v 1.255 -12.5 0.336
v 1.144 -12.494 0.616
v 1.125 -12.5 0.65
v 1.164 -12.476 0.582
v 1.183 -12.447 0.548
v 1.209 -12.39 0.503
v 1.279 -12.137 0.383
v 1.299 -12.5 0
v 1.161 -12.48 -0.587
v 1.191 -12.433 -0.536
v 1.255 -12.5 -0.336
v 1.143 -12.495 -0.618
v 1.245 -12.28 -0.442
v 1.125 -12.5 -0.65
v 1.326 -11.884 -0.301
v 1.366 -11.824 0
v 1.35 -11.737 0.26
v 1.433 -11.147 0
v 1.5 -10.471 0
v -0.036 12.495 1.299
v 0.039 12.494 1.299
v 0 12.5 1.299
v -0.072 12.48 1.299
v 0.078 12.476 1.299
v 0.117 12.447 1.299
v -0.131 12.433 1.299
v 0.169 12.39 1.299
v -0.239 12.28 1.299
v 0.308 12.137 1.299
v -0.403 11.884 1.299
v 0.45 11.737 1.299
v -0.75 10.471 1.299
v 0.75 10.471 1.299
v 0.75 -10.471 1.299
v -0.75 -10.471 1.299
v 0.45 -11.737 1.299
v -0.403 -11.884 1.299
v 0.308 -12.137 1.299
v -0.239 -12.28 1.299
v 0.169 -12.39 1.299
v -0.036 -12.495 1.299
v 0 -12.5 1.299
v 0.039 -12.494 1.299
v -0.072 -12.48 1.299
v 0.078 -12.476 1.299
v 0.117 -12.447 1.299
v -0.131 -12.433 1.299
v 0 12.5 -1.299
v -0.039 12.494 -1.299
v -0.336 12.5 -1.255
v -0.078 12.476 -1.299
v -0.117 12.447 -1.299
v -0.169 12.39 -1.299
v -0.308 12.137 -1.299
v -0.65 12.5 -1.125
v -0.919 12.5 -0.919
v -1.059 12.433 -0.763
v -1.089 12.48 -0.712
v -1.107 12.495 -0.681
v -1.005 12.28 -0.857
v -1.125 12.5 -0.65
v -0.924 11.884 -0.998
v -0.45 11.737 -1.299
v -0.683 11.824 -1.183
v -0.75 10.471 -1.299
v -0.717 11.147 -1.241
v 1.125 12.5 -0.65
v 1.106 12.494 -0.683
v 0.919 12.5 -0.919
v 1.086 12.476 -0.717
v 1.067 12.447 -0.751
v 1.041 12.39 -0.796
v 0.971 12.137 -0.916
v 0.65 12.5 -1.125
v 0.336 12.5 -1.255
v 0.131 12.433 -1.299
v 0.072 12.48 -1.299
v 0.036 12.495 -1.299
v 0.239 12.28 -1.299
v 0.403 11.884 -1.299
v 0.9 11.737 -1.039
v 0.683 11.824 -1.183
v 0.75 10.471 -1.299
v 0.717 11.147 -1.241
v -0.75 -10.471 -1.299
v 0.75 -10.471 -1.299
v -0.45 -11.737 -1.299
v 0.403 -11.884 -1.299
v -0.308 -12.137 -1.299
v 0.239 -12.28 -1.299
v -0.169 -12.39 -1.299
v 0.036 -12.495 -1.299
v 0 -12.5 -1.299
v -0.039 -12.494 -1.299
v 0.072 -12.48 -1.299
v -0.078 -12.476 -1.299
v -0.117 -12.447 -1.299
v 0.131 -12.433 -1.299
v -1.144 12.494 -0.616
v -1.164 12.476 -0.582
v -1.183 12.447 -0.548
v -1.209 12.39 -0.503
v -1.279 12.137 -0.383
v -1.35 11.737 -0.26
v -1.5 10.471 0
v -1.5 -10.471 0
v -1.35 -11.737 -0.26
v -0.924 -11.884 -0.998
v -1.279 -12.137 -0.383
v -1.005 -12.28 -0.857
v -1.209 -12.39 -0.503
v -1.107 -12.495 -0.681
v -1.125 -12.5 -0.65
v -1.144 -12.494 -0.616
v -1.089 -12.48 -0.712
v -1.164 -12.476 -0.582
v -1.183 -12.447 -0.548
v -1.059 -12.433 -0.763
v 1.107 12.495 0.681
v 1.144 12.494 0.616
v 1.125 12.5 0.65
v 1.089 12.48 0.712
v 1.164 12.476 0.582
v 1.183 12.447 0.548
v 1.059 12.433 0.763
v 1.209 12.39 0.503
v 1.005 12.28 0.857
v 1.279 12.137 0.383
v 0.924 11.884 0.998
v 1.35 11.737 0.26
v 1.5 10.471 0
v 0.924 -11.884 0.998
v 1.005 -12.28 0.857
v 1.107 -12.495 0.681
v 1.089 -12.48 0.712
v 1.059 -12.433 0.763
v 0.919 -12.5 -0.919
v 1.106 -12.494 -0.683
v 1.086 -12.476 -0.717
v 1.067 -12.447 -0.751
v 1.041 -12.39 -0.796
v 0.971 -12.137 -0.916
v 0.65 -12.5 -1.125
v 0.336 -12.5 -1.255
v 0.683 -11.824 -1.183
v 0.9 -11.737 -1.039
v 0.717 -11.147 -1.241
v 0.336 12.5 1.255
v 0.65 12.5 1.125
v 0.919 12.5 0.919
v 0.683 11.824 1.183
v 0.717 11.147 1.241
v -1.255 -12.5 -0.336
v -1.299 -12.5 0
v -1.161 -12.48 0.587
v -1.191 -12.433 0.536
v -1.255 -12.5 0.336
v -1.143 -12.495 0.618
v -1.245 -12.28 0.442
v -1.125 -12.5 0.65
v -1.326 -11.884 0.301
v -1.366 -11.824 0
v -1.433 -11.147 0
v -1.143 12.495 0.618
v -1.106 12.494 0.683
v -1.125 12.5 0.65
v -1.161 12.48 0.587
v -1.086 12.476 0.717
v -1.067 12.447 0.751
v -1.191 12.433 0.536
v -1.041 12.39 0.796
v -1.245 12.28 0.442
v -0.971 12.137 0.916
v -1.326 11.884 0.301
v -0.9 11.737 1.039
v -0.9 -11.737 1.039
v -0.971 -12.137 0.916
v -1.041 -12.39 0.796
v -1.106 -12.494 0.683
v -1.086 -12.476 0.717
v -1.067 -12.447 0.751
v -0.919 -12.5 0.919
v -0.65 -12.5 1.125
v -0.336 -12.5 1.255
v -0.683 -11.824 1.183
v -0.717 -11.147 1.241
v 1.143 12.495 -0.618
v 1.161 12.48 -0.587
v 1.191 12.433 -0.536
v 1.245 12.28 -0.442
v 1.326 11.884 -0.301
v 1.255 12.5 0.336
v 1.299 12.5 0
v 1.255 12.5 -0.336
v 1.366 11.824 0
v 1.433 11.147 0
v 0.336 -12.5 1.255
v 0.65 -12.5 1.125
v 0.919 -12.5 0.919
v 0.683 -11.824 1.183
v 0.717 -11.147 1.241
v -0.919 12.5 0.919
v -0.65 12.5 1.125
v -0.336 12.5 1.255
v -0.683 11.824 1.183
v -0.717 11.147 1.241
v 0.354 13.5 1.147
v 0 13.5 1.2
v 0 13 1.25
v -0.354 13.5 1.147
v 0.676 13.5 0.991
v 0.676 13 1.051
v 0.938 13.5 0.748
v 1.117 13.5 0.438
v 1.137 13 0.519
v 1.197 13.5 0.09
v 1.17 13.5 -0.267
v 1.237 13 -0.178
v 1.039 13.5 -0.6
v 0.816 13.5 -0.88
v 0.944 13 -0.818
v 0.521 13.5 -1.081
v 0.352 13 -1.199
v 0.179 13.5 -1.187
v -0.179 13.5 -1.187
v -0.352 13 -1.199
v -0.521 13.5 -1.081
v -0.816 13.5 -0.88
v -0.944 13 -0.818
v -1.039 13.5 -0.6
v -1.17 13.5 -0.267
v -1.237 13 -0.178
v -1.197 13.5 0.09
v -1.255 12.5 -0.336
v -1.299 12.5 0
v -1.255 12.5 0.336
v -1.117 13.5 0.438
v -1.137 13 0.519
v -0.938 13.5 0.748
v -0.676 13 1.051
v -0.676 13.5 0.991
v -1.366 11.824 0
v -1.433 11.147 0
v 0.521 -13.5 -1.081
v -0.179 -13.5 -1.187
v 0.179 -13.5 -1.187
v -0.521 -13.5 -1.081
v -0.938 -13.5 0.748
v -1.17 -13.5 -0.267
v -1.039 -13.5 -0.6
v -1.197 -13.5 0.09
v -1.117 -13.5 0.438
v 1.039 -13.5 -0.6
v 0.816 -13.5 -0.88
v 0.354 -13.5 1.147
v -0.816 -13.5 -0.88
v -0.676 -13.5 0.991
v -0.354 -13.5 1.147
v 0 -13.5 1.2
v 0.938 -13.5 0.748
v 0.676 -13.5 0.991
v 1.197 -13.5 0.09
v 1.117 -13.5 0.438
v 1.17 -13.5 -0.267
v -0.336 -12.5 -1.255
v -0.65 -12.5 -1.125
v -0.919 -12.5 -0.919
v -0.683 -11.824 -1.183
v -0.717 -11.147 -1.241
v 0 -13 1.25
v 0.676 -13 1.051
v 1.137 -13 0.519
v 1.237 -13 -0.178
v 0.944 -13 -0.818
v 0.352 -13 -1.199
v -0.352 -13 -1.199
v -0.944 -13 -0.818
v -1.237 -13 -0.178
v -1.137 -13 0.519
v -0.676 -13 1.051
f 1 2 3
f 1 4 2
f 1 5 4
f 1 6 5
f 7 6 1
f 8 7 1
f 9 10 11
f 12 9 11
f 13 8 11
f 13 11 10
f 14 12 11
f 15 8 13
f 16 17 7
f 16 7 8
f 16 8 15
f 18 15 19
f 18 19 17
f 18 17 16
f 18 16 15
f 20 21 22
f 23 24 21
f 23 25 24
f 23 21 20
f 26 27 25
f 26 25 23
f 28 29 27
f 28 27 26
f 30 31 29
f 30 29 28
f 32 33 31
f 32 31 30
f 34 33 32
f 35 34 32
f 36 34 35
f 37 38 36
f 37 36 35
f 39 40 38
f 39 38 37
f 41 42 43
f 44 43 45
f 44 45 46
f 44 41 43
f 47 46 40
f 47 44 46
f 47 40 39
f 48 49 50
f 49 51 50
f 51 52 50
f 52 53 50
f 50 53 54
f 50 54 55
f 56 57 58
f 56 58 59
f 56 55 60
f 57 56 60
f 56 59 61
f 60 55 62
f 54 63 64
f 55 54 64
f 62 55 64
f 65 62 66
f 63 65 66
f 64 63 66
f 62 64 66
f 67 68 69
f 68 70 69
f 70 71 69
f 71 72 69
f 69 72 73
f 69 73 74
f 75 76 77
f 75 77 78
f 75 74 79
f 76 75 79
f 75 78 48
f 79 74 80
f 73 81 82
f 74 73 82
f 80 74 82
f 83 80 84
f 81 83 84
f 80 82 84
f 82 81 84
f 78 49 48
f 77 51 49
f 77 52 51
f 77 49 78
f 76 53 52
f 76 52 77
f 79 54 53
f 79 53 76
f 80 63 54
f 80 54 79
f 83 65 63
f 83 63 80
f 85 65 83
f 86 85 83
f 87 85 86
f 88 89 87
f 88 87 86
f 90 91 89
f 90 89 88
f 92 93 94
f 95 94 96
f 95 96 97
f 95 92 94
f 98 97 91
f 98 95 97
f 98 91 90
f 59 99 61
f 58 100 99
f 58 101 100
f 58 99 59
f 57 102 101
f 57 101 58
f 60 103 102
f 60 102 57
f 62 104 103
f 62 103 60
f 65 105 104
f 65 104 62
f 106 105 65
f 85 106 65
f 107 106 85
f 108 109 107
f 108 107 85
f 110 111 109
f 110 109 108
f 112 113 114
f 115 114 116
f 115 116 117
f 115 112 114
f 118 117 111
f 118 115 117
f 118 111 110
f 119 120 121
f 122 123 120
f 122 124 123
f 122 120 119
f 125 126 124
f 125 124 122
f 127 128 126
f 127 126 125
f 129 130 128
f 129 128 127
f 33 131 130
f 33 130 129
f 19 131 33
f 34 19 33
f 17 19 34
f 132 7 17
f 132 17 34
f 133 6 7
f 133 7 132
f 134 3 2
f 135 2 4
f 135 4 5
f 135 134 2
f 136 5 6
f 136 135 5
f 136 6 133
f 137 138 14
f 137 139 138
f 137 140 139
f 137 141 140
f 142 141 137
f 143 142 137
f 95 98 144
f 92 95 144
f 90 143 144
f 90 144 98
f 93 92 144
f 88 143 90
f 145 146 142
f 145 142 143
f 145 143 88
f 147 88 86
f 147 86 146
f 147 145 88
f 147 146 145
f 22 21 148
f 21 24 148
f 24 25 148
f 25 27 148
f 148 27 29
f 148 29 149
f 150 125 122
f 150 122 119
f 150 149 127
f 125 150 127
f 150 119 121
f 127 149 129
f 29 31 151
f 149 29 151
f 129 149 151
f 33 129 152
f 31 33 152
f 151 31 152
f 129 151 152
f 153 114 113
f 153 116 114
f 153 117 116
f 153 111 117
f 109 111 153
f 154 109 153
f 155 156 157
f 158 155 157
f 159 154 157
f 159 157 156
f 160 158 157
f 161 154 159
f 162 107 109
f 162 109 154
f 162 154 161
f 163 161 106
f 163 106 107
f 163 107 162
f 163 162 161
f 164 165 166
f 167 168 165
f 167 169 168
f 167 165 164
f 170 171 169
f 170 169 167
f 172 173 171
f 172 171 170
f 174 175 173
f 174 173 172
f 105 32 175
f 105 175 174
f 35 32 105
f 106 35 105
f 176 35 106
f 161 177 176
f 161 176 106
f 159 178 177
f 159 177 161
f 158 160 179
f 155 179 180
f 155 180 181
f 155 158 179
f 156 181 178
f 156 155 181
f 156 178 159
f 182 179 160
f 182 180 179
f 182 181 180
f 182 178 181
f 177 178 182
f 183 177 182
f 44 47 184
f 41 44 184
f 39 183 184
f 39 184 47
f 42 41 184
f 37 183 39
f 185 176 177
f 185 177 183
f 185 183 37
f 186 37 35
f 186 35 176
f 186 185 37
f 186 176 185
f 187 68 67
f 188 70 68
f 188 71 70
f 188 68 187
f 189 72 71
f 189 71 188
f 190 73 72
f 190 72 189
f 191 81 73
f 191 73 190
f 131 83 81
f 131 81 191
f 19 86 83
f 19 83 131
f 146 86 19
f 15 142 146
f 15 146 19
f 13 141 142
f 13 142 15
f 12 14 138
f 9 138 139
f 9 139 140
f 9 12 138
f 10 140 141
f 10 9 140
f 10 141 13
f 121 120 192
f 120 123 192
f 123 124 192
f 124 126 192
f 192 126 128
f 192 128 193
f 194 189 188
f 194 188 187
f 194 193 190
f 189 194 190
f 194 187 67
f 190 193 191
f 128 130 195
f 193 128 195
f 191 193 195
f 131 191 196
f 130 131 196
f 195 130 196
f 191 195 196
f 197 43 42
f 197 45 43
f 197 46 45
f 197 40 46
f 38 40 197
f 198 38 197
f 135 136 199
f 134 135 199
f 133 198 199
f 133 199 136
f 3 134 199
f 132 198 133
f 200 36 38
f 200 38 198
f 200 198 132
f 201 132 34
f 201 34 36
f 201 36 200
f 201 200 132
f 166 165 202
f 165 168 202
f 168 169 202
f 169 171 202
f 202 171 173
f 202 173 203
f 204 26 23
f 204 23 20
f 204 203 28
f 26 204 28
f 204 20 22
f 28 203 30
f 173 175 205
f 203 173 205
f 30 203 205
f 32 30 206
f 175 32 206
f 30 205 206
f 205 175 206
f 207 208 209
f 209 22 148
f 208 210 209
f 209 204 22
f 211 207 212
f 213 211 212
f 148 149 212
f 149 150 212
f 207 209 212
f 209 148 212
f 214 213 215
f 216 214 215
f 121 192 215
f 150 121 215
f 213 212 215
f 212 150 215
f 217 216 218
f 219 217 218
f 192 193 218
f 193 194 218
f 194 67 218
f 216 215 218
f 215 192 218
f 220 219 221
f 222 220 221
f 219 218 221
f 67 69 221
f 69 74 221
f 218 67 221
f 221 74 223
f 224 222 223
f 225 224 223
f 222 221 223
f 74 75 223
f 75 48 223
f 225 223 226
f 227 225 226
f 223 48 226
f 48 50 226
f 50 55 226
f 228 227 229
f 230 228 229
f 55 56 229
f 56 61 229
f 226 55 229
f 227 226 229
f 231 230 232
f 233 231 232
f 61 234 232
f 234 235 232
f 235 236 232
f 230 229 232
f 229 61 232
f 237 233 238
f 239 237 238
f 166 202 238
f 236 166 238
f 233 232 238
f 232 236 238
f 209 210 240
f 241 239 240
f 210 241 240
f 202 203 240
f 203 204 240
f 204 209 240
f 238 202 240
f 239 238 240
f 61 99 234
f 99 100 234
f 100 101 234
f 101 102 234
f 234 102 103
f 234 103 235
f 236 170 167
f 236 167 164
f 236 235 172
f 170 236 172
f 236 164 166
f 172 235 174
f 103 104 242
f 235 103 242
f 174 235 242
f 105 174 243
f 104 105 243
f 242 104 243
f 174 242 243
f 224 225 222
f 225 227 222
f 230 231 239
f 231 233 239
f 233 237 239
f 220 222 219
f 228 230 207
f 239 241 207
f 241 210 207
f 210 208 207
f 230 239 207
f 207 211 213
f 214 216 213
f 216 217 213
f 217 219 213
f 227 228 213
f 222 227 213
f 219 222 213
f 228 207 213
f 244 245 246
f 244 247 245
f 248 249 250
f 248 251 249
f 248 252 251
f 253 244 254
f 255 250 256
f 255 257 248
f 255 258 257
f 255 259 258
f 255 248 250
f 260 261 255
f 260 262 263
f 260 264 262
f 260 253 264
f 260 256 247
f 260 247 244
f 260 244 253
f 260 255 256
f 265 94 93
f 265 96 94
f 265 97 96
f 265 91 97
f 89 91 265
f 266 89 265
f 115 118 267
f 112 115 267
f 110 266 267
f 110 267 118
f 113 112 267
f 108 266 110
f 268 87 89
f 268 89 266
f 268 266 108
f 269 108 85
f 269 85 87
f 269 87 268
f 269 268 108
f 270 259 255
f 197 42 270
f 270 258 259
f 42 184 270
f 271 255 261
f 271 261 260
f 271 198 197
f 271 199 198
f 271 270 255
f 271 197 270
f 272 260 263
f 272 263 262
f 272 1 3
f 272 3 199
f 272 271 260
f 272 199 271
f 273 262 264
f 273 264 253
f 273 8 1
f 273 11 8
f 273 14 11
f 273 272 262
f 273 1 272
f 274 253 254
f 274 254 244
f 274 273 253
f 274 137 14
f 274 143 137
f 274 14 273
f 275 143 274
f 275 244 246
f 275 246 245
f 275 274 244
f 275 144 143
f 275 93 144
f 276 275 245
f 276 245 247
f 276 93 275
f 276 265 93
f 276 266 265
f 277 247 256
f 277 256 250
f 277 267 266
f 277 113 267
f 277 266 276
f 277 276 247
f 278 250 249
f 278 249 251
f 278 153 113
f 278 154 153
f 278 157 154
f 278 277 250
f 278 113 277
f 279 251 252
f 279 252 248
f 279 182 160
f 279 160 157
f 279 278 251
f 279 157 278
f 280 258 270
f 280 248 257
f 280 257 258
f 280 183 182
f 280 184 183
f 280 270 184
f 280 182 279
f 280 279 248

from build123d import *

# Parameters (mm, degrees)
F1_DEPTH = 13.5


with BuildPart() as f1:
    # F0 (on Front) → F1 (new body)
    with BuildSketch(Plane.XZ):
        Polygon((-0.75, 1.299038), (-1.5, 0), (-0.75, -1.299038), (0.75, -1.299038), (1.5, 0), (0.75, 1.299038), align=None)
    extrude(amount=F1_DEPTH)

    # F2 (on Right) → F3 (revolve, cut)
    with BuildSketch(Plane.YZ):
        Polygon((-15.530407, 0.998912), (-13.5, 1.2), (-12.5, 1.299038), (-0.627136, 2.474904), (-15.530407, 2.474904), align=None)
    revolve(axis=Axis((0, 7.533245, 0), (0, 1, 0)), mode=Mode.SUBTRACT)

    # F4: F1 across plane


with BuildPart() as f1_1:
    add(f1.part)
    add(f1.part.mirror(Plane.XZ))


solid = f1_1.part
